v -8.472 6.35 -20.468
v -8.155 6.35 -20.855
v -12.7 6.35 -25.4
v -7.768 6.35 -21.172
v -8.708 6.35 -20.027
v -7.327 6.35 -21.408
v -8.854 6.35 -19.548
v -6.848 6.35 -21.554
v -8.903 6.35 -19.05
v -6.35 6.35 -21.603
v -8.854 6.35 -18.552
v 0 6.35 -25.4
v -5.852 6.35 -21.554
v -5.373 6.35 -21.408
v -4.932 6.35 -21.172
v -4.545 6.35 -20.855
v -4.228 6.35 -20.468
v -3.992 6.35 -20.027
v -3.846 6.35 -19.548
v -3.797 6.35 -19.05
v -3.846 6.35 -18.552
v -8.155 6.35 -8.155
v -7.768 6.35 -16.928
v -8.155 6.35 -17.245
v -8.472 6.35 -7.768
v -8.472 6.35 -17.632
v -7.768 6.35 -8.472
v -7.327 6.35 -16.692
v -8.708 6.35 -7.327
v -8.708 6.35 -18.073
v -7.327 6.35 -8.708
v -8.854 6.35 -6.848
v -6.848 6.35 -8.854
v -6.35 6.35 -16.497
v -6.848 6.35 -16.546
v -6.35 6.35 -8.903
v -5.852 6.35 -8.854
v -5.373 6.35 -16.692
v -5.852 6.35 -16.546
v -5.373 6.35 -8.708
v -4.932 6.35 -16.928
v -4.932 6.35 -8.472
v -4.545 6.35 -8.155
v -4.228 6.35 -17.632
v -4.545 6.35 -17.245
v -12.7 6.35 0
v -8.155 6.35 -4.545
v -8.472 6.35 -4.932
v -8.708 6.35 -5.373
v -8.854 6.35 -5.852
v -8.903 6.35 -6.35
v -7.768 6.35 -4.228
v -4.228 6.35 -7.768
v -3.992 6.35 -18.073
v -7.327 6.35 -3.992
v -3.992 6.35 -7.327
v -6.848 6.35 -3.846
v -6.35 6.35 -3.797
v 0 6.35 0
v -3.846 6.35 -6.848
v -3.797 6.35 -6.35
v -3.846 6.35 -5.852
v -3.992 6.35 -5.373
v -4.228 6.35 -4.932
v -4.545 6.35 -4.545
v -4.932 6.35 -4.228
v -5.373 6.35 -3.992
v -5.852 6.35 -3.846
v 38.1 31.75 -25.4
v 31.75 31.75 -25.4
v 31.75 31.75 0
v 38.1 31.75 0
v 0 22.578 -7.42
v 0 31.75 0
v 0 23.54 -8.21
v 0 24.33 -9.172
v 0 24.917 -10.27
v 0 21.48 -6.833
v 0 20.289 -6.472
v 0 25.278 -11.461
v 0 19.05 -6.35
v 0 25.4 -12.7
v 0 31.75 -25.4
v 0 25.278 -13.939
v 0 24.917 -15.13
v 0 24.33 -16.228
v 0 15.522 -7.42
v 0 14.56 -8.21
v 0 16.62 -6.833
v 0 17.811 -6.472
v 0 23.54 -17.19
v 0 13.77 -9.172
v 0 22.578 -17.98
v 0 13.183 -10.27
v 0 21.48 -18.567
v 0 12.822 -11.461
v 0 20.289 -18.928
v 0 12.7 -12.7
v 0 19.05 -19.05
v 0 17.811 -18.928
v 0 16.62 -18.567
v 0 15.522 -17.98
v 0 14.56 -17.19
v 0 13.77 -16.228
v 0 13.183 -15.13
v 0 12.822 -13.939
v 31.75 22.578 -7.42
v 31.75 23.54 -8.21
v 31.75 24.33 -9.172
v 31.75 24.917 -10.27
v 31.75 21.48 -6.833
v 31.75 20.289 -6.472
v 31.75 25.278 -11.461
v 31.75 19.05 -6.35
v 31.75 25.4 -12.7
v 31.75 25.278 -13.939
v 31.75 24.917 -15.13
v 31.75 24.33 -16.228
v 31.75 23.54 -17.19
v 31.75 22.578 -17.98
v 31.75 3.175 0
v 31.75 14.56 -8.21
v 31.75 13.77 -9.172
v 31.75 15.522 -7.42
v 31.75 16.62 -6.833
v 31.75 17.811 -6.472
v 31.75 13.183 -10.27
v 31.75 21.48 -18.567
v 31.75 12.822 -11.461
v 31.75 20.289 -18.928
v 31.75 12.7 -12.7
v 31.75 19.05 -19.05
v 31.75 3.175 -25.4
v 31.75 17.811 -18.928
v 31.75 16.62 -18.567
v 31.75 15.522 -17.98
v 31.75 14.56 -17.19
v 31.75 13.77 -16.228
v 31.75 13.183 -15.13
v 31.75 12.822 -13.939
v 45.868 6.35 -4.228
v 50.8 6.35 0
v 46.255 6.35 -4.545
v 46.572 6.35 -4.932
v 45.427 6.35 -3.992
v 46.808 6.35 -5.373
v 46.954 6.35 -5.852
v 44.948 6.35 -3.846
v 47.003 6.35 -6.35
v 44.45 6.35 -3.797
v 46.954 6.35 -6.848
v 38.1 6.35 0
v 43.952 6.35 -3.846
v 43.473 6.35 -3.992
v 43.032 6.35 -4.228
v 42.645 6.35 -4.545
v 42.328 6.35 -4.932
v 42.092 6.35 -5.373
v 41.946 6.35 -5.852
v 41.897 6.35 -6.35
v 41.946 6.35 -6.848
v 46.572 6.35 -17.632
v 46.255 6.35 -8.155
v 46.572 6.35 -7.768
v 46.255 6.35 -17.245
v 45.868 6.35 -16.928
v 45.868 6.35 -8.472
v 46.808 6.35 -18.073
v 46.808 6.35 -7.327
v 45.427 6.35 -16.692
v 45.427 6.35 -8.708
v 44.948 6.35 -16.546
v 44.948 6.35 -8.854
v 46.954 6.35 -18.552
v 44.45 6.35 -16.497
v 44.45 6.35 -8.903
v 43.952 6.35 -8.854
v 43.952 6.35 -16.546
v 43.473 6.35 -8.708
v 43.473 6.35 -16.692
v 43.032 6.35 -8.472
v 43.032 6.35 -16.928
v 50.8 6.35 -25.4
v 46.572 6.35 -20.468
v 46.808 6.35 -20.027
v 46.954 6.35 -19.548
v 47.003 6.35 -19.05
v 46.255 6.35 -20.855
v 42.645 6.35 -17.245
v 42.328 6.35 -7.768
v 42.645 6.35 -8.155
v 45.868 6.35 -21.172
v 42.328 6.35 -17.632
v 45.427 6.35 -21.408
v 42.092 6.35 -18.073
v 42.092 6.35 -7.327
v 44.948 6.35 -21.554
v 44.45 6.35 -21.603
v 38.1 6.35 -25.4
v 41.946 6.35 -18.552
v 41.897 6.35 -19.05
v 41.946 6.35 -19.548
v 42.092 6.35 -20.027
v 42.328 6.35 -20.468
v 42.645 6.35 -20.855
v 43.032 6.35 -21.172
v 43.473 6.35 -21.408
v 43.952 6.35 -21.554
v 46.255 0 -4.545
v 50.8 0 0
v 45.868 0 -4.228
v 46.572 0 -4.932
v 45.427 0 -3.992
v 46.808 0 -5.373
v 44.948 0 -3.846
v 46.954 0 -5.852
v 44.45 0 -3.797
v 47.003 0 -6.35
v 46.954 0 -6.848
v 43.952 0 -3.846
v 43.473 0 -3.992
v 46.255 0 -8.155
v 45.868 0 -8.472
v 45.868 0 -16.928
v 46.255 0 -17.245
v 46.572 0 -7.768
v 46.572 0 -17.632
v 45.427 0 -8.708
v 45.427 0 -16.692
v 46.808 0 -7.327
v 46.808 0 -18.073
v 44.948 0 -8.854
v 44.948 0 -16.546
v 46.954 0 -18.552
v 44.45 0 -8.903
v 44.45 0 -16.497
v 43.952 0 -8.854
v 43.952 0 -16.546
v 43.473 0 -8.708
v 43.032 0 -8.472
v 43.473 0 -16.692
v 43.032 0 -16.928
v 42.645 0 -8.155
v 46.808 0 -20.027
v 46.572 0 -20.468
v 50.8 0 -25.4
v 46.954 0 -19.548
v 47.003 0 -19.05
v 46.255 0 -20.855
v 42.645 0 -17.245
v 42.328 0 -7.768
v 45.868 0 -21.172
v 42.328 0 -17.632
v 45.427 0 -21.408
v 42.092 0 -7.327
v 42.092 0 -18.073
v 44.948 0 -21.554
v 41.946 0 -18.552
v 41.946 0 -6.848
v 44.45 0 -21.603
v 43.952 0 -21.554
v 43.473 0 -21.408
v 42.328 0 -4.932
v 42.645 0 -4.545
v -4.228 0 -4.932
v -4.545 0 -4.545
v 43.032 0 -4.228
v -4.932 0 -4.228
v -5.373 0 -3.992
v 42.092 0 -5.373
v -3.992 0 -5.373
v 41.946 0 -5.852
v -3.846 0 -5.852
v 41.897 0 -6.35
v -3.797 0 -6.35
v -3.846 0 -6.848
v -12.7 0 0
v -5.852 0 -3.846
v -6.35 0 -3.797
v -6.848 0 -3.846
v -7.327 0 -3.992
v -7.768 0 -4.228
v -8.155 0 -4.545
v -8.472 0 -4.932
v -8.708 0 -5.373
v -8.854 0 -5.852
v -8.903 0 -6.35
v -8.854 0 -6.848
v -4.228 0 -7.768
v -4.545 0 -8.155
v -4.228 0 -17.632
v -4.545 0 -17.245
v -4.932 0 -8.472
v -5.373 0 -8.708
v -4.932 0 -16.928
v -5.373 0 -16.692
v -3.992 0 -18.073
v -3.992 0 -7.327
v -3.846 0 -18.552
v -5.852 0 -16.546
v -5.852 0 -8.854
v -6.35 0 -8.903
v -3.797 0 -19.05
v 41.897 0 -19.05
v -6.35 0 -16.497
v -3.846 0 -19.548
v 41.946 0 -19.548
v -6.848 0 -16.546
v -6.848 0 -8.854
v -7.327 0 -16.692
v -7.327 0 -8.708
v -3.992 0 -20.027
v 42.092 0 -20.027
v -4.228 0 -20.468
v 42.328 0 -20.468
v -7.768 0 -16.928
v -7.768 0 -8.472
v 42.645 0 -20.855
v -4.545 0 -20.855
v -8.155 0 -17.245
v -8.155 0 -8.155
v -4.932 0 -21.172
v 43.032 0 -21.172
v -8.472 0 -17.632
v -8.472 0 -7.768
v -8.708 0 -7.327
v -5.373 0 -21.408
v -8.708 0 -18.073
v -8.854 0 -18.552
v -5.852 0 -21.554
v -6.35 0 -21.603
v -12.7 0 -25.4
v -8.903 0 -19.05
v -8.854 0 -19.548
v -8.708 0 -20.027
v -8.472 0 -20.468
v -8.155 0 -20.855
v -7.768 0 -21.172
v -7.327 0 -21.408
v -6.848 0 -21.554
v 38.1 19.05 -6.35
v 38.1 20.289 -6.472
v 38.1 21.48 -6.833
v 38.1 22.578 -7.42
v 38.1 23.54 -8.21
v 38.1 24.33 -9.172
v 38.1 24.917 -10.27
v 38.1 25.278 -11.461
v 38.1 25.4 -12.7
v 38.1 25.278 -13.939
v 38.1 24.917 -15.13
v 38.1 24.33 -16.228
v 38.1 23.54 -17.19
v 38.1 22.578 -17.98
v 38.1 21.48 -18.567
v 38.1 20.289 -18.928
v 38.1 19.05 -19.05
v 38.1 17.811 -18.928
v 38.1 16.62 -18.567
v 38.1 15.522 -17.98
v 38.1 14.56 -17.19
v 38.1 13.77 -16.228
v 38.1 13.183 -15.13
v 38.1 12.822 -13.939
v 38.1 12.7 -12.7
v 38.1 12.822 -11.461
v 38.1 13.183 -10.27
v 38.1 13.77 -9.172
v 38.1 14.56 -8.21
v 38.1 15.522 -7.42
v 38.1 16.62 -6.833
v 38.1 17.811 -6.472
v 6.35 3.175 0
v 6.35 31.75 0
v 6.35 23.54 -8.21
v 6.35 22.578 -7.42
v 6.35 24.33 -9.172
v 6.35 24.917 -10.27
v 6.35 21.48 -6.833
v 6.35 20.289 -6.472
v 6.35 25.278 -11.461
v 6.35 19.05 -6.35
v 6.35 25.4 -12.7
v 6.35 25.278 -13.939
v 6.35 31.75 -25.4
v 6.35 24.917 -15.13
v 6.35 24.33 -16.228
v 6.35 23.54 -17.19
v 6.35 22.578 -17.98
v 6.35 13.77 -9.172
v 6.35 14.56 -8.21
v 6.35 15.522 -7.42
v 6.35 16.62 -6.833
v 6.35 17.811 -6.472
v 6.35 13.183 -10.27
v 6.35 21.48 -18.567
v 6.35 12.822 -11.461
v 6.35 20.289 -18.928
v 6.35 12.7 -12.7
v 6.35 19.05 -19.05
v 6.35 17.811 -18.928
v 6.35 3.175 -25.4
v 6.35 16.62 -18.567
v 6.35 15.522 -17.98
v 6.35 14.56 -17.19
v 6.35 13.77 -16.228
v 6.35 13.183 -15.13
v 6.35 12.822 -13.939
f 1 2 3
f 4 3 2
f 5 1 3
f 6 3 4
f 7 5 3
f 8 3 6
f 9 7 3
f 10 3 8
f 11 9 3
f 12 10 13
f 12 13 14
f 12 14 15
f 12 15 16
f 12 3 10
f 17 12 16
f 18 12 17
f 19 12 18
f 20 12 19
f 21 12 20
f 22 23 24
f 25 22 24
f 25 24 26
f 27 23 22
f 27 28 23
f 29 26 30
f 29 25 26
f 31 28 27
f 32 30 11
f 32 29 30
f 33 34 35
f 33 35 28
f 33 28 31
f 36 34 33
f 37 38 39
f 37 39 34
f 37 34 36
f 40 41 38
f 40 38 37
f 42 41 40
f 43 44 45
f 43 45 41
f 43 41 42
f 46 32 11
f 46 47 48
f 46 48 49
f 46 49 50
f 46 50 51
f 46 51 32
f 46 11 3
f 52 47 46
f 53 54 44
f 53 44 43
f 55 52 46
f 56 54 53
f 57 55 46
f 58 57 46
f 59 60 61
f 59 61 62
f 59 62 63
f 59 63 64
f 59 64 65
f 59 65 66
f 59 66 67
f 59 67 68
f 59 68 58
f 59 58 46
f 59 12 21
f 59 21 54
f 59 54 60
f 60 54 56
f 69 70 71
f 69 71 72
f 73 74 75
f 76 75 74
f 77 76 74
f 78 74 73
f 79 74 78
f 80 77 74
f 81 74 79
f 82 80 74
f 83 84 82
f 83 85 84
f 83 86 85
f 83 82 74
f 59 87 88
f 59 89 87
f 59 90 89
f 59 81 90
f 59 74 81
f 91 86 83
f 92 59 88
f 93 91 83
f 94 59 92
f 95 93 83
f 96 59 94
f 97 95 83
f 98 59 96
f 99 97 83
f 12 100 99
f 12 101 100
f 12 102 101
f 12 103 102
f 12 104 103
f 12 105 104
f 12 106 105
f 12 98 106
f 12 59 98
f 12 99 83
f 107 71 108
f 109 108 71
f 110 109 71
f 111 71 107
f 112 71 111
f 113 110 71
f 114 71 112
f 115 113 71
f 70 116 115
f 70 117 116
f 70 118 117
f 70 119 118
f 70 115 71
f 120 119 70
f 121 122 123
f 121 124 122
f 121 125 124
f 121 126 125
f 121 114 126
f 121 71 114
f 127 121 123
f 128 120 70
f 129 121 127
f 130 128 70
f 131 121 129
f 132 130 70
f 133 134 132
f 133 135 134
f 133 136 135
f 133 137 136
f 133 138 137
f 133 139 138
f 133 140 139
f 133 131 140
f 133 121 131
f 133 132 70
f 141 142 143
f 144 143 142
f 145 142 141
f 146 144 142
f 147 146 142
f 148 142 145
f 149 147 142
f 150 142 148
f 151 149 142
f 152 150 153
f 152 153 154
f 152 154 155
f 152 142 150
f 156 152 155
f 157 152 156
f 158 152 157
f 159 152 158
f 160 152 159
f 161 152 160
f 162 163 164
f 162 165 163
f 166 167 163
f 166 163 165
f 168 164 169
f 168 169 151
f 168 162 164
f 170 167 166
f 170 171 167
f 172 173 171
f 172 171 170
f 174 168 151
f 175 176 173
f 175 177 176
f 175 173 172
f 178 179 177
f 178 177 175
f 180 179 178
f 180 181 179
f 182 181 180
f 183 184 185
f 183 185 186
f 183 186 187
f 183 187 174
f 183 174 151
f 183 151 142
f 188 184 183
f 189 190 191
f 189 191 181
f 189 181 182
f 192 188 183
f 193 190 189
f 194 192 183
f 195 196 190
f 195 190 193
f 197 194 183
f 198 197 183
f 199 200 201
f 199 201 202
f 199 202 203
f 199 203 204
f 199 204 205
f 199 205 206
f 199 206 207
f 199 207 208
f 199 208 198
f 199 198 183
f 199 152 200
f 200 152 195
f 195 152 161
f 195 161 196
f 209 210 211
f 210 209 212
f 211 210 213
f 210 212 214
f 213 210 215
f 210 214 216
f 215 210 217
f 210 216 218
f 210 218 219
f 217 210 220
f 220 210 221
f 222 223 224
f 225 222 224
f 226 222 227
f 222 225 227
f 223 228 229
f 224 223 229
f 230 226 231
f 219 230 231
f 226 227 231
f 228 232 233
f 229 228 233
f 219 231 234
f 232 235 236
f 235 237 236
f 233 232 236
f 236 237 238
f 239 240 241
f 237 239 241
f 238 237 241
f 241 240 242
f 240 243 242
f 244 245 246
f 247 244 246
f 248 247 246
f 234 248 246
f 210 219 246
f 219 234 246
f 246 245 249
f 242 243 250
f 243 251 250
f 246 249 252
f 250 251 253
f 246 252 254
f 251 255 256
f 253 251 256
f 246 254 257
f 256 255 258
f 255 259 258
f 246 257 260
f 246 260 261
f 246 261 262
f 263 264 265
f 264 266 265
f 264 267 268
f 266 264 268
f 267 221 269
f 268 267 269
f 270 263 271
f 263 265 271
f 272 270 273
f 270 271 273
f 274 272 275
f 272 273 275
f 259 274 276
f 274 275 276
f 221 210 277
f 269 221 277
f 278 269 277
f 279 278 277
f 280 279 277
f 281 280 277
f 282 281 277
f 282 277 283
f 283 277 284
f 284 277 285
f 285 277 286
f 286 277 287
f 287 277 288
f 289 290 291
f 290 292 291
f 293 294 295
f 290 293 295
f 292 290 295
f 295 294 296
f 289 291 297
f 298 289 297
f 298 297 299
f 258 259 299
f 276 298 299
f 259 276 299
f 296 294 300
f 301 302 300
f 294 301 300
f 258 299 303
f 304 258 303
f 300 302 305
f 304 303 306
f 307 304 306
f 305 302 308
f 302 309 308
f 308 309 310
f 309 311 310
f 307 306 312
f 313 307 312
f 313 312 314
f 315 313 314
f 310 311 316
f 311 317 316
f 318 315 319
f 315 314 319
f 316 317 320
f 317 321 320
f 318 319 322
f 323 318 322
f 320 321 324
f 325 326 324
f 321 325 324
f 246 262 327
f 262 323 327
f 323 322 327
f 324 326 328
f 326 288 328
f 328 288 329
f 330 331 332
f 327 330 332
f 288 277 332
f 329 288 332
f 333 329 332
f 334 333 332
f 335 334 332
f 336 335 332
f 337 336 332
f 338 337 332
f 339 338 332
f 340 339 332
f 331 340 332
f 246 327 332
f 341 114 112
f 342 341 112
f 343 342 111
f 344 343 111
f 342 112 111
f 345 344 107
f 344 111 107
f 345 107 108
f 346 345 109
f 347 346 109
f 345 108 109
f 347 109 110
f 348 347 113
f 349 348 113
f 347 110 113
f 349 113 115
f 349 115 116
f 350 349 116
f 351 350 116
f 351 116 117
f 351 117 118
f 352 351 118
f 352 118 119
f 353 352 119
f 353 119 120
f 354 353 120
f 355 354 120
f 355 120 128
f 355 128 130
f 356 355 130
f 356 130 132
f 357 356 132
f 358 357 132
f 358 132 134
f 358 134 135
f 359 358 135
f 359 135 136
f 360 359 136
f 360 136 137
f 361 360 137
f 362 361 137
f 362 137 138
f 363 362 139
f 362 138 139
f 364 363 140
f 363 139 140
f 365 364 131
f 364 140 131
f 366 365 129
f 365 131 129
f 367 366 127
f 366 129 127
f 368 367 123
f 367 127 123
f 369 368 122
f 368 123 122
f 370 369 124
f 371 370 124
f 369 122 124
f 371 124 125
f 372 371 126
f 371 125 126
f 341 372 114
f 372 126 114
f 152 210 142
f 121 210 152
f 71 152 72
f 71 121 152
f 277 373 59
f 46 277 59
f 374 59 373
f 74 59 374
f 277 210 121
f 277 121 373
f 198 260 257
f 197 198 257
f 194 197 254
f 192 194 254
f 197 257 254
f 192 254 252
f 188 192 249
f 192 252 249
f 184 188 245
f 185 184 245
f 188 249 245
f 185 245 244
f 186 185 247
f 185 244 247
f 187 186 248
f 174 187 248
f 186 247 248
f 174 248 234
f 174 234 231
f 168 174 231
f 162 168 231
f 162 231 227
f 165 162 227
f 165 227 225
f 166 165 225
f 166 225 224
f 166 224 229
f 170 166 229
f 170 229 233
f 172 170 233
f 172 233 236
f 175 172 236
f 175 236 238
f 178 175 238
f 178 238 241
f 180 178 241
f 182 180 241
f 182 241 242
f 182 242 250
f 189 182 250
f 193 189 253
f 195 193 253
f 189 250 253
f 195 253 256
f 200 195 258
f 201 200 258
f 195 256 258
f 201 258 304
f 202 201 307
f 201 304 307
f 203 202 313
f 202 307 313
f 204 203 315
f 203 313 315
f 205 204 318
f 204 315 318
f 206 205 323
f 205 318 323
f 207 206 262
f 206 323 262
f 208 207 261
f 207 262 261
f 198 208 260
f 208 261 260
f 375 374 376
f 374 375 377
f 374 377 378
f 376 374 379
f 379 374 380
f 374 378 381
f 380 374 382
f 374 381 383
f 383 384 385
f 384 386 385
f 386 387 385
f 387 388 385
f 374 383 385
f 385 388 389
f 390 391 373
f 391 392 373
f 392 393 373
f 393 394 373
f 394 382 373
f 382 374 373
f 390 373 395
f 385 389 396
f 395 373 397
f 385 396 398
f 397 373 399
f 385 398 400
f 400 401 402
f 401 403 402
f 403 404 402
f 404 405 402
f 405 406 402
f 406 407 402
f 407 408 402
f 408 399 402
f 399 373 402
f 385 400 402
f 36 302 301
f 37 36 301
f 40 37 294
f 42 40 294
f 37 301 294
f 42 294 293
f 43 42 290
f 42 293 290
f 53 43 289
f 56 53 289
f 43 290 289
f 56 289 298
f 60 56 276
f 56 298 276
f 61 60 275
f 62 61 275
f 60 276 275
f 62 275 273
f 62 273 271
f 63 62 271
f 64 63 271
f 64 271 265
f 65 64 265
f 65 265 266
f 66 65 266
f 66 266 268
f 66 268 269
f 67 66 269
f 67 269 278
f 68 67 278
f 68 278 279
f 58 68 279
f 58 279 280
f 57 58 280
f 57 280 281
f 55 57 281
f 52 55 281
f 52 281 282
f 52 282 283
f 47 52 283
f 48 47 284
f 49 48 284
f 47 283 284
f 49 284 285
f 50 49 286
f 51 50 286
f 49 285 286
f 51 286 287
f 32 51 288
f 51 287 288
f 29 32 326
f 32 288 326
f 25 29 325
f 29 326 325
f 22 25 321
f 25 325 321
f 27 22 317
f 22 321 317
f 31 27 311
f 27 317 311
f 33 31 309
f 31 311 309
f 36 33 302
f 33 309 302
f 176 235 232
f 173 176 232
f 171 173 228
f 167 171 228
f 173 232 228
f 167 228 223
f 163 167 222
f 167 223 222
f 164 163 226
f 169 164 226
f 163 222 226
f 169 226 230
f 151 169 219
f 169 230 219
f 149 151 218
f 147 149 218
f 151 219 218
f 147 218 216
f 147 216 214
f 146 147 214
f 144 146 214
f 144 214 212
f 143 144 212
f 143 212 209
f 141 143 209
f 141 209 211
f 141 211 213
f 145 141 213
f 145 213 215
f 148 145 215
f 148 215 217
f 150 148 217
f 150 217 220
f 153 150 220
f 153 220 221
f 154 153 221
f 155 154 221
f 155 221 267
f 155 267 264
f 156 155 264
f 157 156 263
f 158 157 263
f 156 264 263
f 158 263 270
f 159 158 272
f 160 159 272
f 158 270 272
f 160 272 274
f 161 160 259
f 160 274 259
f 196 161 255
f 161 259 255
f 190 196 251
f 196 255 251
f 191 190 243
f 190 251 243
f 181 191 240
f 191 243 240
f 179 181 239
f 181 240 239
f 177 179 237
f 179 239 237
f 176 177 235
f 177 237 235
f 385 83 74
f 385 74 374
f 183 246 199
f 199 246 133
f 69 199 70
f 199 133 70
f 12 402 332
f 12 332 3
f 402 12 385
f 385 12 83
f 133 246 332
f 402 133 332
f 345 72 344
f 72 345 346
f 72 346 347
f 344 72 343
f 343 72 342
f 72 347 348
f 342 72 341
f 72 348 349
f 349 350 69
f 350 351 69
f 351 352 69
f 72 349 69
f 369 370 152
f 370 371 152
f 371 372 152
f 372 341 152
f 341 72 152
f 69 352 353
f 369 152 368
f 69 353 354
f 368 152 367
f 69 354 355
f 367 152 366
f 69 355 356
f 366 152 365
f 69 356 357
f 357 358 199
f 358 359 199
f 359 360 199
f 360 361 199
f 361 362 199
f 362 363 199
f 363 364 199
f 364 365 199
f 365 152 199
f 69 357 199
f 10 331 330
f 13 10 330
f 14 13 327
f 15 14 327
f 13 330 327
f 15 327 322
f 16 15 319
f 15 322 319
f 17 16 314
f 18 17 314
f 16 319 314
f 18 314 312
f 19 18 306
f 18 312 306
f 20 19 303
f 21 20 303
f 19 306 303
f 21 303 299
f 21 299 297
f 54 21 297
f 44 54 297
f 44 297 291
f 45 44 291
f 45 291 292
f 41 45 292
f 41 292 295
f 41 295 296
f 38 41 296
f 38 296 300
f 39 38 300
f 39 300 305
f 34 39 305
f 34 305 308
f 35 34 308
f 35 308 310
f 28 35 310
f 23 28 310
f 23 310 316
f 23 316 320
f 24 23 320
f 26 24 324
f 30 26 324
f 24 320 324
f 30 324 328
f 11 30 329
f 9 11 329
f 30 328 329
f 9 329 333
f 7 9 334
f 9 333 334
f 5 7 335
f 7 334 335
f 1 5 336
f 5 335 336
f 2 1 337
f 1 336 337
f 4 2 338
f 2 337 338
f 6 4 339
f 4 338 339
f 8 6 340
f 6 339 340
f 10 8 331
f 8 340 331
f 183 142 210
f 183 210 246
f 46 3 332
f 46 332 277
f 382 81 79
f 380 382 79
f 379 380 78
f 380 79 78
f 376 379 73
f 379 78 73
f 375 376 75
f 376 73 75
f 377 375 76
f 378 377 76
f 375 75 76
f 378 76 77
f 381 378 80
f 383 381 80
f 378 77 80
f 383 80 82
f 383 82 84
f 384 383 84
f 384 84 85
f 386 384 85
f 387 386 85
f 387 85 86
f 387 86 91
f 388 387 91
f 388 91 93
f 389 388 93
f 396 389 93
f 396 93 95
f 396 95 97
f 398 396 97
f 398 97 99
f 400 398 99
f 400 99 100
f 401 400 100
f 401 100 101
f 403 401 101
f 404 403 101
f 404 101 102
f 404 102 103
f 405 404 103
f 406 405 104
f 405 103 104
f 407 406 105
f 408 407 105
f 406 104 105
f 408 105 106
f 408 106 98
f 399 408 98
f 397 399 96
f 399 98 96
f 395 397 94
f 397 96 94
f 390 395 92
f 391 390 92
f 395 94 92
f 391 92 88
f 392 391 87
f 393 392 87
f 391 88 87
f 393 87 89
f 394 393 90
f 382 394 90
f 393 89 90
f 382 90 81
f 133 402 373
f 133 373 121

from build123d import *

# Parameters (mm, degrees)
SKETCH2_W                   = 6.35
SKETCH2_H                   = 25.4
BOSS_EXTRUDE1_DEPTH         = 31.75
BOSS_EXTRUDE1_2_DEPTH       = 31.75
SKETCH2_3_W                 = 25.4
SKETCH2_3_H                 = 25.4
BOSS_EXTRUDE2_DEPTH         = 3.175
SKETCH3_R                   = 6.35
CUT_EXTRUDE1_DEPTH          = 56.72102386
SKETCH4_W                   = 25.4
SKETCH4_H                   = 6.35
BOSS_EXTRUDE3_DEPTH         = 12.7
SKETCH9_W                   = 25.4
SKETCH9_H                   = 6.35
BOSS_EXTRUDE5_DEPTH         = 12.7
F_1_4_20_TAPPED_HOLE3_D     = 5.1054
F_1_4_20_TAPPED_HOLE3_DEPTH = 19.05
F_1_4_20_TAPPED_HOLE3_TIP   = 1.533816902


with BuildPart() as part:
    # Sketch2 → Boss-Extrude1 (new body)
    with BuildSketch(Plane(origin=(0, 0, 0), x_dir=(1, 0, 0), z_dir=(0, 1, 0))):
        with Locations((3.175, 12.7)):
            Rectangle(SKETCH2_W, SKETCH2_H)
    extrude(amount=BOSS_EXTRUDE1_DEPTH)



with BuildPart() as body_2:
    # Sketch2 → Boss-Extrude1 2 (new body)
    with BuildSketch(Plane(origin=(0, 0, 0), x_dir=(1, 0, 0), z_dir=(0, 1, 0))):
        with Locations((34.925, 12.7)):
            Rectangle(SKETCH2_W, SKETCH2_H)
    extrude(amount=BOSS_EXTRUDE1_2_DEPTH)


with BuildPart() as part_1:
    add(part.part)

    add(body_2.part)  # Boss-Extrude2 merges body 2
    # Sketch2<3> → Boss-Extrude2 (add)
    with BuildSketch(Plane(origin=(0, 0, 0), x_dir=(1, 0, 0), z_dir=(0, 1, 0))):
        with Locations((19.05, 12.7)):
            Rectangle(SKETCH2_3_W, SKETCH2_3_H)
    extrude(amount=BOSS_EXTRUDE2_DEPTH)

    # Sketch3 → Cut-Extrude1 (cut, through all)
    with BuildSketch(Plane.ZY):
        with Locations((-12.7, 19.05)):
            Circle(SKETCH3_R)
    extrude(amount=-CUT_EXTRUDE1_DEPTH, mode=Mode.SUBTRACT)

    # Sketch4 → Boss-Extrude3 (add)
    with BuildSketch(Plane.ZY):
        with Locations((-12.7, 3.175)):
            Rectangle(SKETCH4_W, SKETCH4_H)
    extrude(amount=BOSS_EXTRUDE3_DEPTH)

    # Sketch9 → Boss-Extrude5 (add)
    with BuildSketch(Plane(origin=(38.1, 0, 0), x_dir=(0, 0, -1), z_dir=(1, 0, 0))):
        with Locations((12.7, 3.175)):
            Rectangle(SKETCH9_W, SKETCH9_H)
    extrude(amount=BOSS_EXTRUDE5_DEPTH)

    # 1/4-20 Tapped Hole3
    with Locations(Plane(origin=(-6.35, 6.35, -19.05), x_dir=(0, 0, 1), z_dir=(0, 1, 0))):
        with Locations((0, 0), (12.7, 0), (12.7, 50.8), (0, 50.8)):
            Hole(F_1_4_20_TAPPED_HOLE3_D / 2, depth=F_1_4_20_TAPPED_HOLE3_DEPTH)
            with Locations((0, 0, -(F_1_4_20_TAPPED_HOLE3_DEPTH + F_1_4_20_TAPPED_HOLE3_TIP / 2))):  # 118° drill point
                Cone(0, F_1_4_20_TAPPED_HOLE3_D / 2, F_1_4_20_TAPPED_HOLE3_TIP, mode=Mode.SUBTRACT)


solid = part_1.part
